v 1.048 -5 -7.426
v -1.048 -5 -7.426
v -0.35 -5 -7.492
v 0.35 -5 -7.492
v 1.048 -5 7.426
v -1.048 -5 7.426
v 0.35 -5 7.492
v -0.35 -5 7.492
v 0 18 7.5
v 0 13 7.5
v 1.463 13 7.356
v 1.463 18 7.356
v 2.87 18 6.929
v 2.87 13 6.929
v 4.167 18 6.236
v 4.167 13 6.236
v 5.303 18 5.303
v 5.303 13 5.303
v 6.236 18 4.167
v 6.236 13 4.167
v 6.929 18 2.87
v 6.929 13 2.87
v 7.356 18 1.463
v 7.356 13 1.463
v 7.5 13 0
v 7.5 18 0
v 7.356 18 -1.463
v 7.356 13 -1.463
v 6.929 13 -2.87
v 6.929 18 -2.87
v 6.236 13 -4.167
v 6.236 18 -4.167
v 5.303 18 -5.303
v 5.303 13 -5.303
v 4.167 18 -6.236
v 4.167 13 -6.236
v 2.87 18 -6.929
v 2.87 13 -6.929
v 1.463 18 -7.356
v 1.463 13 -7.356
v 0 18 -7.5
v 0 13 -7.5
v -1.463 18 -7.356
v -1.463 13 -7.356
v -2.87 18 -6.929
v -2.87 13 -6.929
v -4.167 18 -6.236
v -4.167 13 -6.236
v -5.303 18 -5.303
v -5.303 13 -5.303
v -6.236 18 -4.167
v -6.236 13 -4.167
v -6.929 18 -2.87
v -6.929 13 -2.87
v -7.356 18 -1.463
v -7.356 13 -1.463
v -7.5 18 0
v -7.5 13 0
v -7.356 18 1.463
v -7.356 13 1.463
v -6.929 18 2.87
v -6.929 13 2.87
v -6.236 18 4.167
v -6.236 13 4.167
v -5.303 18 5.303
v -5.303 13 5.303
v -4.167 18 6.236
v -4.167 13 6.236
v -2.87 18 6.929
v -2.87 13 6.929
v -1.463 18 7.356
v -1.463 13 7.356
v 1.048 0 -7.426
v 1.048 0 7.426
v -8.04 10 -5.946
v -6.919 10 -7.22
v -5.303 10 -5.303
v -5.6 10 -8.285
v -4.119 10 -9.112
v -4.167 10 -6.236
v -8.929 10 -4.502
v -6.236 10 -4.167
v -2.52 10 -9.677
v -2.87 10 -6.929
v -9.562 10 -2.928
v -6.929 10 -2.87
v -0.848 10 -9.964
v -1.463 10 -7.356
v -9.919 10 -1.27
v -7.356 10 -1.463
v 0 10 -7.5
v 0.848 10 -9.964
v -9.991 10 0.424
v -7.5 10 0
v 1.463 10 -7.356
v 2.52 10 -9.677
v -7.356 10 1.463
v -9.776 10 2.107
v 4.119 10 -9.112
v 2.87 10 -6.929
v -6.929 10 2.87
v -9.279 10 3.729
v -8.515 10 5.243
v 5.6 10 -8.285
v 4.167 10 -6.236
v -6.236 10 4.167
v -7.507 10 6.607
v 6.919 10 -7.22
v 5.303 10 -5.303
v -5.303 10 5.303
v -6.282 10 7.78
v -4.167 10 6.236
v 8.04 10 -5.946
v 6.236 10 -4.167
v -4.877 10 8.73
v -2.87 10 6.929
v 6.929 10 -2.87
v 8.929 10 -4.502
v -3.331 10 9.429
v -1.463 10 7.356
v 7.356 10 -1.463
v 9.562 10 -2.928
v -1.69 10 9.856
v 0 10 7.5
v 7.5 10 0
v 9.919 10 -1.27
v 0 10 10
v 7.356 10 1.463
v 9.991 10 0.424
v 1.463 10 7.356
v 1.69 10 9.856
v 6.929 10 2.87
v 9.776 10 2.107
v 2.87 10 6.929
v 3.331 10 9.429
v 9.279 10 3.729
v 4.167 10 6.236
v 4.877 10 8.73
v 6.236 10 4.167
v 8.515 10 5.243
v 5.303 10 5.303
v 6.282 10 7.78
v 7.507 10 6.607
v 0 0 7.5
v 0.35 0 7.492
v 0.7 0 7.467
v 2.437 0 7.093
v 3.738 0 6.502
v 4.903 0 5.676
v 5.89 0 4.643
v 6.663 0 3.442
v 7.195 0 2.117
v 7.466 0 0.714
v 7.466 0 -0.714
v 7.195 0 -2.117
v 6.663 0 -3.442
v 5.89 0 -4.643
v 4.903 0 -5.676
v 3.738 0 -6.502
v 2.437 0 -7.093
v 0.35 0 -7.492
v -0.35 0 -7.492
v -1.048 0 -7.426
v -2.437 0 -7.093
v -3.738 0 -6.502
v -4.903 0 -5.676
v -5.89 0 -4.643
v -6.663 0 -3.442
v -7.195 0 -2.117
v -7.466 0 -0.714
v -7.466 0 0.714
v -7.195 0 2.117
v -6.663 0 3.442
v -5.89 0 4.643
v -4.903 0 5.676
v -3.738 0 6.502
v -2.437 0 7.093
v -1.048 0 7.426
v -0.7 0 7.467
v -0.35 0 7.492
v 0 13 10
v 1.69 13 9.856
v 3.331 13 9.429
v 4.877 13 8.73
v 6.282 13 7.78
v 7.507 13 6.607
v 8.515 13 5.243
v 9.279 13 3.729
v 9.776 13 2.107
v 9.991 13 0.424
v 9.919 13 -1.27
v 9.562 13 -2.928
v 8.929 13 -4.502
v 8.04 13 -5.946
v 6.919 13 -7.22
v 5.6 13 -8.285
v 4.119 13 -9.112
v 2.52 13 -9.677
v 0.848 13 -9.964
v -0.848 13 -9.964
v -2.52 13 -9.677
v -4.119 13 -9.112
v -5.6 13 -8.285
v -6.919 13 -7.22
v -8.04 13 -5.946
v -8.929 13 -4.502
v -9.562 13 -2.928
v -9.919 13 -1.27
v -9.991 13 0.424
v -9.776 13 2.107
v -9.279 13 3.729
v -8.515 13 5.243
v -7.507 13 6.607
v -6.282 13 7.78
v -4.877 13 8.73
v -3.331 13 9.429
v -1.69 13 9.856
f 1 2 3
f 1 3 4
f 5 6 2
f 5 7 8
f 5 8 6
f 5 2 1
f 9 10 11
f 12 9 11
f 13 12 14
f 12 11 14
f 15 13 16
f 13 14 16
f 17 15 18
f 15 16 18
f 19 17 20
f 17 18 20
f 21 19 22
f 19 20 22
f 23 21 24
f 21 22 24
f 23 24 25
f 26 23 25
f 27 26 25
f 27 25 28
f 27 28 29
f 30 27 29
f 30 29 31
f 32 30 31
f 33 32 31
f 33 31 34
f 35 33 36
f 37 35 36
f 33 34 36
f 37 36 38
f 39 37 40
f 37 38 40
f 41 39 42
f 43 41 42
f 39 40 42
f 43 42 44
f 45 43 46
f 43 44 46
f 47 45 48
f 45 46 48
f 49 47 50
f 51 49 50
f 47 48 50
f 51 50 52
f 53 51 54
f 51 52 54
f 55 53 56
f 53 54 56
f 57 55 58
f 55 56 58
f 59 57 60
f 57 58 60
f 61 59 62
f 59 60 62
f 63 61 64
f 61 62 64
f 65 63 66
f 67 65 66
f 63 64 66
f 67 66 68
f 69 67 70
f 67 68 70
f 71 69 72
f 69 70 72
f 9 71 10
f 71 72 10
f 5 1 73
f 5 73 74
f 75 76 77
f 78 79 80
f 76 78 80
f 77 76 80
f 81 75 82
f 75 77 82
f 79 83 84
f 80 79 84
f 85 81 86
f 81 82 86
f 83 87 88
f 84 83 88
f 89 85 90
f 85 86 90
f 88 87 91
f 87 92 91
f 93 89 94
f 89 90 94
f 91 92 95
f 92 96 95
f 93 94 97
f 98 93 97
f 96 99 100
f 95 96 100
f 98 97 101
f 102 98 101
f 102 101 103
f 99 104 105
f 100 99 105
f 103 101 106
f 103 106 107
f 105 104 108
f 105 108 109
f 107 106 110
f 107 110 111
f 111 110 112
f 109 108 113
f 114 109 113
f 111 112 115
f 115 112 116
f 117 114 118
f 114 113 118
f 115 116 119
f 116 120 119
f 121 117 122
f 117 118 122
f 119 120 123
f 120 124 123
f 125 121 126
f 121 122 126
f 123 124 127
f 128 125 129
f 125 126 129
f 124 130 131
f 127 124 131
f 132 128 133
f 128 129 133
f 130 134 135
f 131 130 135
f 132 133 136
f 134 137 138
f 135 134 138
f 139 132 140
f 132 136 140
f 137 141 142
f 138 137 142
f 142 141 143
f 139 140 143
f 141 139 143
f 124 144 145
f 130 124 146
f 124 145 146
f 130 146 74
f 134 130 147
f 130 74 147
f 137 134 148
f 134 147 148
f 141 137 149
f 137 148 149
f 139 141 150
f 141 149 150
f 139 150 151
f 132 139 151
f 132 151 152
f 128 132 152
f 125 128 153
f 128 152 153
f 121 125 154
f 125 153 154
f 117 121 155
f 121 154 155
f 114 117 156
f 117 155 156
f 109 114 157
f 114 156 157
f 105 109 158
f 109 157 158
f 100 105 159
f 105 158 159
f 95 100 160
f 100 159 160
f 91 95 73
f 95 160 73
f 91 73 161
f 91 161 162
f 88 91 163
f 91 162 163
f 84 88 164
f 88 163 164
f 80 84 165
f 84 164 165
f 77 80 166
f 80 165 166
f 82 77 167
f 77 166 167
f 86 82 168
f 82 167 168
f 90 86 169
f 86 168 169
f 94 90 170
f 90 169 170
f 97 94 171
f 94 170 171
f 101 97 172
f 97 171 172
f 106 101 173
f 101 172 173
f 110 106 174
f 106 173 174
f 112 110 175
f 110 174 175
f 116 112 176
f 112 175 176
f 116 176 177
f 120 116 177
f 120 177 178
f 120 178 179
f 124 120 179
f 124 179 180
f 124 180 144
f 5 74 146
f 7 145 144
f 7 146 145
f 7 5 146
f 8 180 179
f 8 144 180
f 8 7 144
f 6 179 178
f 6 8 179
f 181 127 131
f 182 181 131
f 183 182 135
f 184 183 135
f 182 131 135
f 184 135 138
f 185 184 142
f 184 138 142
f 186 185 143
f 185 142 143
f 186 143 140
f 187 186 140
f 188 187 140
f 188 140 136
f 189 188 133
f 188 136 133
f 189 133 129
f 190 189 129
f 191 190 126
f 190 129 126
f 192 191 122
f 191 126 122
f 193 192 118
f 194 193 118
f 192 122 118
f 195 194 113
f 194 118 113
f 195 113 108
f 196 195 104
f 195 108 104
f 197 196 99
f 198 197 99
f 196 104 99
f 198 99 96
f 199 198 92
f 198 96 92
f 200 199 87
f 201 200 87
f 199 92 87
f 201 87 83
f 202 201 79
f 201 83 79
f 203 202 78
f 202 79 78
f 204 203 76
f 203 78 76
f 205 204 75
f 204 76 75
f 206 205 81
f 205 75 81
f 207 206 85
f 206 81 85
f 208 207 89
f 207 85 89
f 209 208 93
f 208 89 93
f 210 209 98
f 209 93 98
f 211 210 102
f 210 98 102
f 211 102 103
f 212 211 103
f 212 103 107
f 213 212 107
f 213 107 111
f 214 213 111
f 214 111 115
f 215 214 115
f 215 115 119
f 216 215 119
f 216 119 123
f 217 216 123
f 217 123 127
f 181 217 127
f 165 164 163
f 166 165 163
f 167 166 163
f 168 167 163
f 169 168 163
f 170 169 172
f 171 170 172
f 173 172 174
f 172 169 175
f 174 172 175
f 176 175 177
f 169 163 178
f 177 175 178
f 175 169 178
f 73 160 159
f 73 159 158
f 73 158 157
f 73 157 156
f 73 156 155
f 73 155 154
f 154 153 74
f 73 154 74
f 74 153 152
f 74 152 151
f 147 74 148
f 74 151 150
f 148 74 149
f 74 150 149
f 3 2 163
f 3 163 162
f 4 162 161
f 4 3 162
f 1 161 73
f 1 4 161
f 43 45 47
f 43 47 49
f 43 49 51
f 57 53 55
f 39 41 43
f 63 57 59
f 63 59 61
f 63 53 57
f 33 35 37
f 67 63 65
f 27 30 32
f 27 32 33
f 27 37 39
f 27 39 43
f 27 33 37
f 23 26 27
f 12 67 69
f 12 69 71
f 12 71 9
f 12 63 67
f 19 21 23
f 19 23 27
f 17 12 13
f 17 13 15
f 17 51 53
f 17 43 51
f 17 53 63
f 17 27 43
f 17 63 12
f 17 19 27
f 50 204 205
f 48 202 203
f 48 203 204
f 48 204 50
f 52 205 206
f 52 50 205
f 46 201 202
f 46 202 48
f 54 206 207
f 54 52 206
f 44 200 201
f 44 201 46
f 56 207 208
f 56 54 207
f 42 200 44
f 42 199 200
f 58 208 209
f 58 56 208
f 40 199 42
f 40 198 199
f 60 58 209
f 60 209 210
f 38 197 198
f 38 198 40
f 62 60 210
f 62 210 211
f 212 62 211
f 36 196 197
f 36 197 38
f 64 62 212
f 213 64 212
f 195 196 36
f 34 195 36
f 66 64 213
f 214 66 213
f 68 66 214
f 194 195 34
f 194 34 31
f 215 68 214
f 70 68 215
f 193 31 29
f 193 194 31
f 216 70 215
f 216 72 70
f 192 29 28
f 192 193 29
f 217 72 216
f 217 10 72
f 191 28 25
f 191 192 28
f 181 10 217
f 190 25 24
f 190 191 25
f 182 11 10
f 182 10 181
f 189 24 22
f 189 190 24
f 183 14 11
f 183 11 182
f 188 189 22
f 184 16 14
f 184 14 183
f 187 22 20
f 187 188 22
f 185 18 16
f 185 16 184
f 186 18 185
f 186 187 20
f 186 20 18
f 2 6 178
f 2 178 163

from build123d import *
from build123d.topology import SkipClean

# Parameters (mm, degrees)
SKETCH_1_R      = 7.5
EXTRUDE_1_DEPTH = 10
SKETCH_2_R      = 10
EXTRUDE_2_DEPTH = 3
SKETCH_3_R      = 7.5
EXTRUDE_3_DEPTH = 5
EXTRUDE_START   = 5
EXTRUDE_4_DEPTH = 5


with BuildPart() as part:
    # 草图1 → 凸台-拉伸1 (new body)
    with BuildSketch(Plane(origin=(0, 0, 0), x_dir=(1, 0, 0), z_dir=(0, 1, 0))):
        with Locations(Location((0, 0, 0), (0, 0, 270))):
            Circle(SKETCH_1_R)
    extrude(amount=EXTRUDE_1_DEPTH)

    # 草图2 → 凸台-拉伸2 (add)
    with BuildSketch(Plane(origin=(0, 10, 0), x_dir=(1, 0, 0), z_dir=(0, 1, 0))):
        with Locations(Location((0, 0, 0), (0, 0, 270))):
            Circle(SKETCH_2_R)
    extrude(amount=EXTRUDE_2_DEPTH)

    # 草图3 → 凸台-拉伸3 (add)
    with BuildSketch(Plane(origin=(0, 13, 0), x_dir=(1, 0, 0), z_dir=(0, 1, 0))):
        with Locations(Location((0, 0, 0), (0, 0, 270))):
            Circle(SKETCH_3_R)
    extrude(amount=EXTRUDE_3_DEPTH)

    # 草图4 → 凸台-拉伸4 (add)
    with SkipClean():  # the faces are left unmerged after this step: merging them gives an invalid solid
        with BuildSketch(Plane.XZ.offset(EXTRUDE_START)):
            with BuildLine():
                Line((-1.048132204, 7.426400129), (-1.048132204, -7.426400129))
                ThreePointArc((-1.048132204, -7.426400129), (0, -7.5), (1.048132204, -7.426400129))
                Line((1.048132204, -7.426400129), (1.048132204, 7.426400129))
                ThreePointArc((1.048132204, 7.426400129), (0, 7.5), (-1.048132204, 7.426400129))
            make_face()
        extrude(amount=-EXTRUDE_4_DEPTH)


solid = part.part
